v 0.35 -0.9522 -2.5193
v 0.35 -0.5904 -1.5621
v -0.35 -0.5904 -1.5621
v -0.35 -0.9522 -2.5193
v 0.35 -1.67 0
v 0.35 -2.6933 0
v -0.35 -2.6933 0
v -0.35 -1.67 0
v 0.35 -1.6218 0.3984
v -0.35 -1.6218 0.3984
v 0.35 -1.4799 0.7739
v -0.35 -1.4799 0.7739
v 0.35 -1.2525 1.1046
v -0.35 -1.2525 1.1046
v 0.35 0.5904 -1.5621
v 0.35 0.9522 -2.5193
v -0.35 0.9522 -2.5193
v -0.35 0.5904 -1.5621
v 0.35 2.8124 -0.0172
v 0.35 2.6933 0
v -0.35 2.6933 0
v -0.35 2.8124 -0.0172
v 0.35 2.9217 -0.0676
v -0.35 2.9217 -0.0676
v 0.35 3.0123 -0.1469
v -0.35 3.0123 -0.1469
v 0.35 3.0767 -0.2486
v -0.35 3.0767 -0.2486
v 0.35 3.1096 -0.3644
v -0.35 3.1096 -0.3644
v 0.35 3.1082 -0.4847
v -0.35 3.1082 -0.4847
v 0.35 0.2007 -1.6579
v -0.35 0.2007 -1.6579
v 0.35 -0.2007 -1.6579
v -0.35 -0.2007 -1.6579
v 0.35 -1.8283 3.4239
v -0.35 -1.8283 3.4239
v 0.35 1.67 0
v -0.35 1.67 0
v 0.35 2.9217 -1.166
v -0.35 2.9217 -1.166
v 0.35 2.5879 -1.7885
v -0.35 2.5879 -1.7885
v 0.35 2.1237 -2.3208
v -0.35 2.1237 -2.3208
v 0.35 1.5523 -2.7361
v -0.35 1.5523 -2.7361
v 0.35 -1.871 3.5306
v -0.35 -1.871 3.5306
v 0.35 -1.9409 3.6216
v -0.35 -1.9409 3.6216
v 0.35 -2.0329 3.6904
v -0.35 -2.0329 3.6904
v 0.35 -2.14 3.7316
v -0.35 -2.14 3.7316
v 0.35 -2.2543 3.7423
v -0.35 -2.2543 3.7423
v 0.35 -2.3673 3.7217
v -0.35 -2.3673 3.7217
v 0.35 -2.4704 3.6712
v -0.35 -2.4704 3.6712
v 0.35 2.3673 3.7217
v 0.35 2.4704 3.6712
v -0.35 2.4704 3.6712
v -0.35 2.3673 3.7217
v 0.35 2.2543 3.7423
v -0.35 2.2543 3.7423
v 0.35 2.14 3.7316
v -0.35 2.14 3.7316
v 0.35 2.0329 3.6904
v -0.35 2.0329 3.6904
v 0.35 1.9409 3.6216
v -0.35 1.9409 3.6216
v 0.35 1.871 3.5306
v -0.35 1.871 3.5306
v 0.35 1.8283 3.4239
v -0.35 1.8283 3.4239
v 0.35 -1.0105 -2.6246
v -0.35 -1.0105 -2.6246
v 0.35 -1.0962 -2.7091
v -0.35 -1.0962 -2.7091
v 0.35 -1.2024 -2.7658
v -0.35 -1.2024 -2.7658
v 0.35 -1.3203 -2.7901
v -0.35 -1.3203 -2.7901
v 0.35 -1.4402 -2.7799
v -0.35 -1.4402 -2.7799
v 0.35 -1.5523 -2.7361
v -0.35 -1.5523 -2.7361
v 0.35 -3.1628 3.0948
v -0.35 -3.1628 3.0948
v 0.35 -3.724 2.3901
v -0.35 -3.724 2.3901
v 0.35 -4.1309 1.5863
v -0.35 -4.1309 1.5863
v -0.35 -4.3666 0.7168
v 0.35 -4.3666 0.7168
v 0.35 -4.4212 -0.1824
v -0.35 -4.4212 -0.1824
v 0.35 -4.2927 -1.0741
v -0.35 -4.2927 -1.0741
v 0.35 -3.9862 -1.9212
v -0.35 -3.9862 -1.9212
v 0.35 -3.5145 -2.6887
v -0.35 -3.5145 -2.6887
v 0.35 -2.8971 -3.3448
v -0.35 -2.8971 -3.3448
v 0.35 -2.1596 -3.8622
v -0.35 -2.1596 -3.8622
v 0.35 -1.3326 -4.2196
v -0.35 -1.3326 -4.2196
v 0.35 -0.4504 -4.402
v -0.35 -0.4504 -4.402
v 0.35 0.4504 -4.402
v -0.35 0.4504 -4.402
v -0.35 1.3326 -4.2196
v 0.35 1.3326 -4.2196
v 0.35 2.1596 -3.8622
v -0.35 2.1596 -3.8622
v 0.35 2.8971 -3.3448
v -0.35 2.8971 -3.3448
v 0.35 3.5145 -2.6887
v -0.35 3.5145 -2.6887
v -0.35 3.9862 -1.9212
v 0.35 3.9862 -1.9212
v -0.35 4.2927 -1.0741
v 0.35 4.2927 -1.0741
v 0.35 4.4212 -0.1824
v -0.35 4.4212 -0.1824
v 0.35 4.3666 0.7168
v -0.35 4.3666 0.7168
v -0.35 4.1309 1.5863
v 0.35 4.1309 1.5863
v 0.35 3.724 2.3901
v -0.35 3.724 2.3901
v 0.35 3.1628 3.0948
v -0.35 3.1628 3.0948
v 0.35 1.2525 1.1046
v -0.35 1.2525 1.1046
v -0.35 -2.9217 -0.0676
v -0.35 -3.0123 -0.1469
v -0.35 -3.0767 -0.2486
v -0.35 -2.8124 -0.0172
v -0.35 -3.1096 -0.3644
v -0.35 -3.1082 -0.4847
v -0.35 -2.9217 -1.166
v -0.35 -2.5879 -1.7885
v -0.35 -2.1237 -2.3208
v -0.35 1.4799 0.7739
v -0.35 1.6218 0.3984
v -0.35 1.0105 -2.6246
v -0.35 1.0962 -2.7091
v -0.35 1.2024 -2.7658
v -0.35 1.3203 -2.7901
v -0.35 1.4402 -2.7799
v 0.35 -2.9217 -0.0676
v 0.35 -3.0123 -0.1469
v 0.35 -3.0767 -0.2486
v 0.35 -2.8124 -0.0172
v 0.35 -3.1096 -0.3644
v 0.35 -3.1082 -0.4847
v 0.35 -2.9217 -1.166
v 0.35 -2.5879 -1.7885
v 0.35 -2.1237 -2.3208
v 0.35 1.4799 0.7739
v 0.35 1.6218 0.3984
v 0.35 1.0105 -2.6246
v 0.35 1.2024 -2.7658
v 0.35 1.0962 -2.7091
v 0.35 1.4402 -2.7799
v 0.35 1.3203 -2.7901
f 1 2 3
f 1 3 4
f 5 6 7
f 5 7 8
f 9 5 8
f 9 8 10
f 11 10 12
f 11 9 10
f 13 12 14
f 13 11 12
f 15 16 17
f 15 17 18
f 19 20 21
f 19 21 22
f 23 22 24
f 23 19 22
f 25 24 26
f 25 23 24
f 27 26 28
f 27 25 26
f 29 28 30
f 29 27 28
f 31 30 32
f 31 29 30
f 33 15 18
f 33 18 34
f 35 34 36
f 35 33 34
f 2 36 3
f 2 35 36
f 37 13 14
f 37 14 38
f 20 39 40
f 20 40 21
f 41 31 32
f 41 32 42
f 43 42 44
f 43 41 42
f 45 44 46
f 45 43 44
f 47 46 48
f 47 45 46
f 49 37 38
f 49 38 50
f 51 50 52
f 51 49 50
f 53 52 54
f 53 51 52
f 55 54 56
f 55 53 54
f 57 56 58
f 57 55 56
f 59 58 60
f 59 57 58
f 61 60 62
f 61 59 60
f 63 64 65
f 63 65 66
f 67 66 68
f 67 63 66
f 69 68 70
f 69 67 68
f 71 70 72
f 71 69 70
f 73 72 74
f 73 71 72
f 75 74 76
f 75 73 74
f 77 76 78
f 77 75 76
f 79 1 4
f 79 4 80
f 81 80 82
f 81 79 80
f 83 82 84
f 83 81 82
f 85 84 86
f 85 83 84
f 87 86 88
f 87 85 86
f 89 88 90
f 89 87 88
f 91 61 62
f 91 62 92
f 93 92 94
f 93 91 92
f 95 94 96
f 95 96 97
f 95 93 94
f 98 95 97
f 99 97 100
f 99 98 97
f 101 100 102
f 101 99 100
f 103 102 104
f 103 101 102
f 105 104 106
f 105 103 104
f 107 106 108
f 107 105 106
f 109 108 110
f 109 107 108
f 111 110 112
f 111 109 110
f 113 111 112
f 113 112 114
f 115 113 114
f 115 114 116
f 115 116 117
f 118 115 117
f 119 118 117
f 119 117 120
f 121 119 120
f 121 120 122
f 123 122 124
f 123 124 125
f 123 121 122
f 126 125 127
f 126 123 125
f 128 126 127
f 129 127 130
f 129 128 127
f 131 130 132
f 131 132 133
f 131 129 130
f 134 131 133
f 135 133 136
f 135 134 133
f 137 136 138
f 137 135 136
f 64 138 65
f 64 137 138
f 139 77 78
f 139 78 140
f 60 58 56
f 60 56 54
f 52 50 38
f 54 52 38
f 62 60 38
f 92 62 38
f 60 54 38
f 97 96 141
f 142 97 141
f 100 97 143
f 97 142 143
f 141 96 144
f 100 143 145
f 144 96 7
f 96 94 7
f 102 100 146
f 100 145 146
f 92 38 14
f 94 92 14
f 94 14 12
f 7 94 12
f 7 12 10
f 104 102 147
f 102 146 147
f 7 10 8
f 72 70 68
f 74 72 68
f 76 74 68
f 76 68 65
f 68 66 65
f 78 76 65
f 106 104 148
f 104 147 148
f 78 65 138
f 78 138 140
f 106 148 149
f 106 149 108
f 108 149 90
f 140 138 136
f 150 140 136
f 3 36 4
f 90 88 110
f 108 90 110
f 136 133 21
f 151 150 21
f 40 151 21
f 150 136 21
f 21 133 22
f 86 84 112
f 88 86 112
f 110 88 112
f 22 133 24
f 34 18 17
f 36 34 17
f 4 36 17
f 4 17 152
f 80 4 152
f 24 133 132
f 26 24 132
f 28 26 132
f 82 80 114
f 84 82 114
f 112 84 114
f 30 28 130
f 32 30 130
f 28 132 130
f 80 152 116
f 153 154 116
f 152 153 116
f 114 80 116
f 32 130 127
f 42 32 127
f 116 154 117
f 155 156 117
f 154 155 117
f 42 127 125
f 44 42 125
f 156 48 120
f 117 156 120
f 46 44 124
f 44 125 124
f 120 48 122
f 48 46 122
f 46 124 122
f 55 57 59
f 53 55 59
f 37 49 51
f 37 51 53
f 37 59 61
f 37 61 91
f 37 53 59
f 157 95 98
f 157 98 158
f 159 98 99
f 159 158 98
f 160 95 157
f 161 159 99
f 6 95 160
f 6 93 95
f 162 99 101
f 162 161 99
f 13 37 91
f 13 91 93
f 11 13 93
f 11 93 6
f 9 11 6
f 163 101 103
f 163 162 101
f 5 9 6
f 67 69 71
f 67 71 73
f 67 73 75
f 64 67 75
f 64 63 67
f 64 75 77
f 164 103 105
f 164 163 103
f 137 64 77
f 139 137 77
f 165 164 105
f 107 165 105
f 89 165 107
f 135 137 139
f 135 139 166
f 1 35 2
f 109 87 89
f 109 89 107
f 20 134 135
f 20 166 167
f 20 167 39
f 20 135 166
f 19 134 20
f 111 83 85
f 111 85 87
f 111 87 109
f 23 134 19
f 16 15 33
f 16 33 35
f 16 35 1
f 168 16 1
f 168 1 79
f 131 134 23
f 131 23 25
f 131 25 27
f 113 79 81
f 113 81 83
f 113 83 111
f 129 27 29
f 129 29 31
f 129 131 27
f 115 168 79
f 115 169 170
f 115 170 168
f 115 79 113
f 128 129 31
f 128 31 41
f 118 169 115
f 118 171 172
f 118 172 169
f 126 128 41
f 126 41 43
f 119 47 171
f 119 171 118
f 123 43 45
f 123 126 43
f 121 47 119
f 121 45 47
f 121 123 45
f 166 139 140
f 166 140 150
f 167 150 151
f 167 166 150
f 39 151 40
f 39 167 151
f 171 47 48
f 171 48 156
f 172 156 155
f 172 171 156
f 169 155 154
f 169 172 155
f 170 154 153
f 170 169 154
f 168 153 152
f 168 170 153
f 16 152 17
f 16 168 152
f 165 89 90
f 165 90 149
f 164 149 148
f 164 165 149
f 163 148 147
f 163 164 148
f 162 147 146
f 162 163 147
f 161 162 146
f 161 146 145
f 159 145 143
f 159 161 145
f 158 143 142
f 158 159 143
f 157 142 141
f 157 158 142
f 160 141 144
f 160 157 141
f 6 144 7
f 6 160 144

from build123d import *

# Parameters (mm, degrees)
RESSALTO_EXTRUS_O1_DEPTH = 0.7


with BuildPart() as part:
    # Esboço1 → Ressalto-extrusão1 (new body)
    with BuildSketch(Plane(origin=(0.35, 0, 0), x_dir=(0, 0, -1), z_dir=(1, 0, 0))):
        with BuildLine():
            Line((-1.104601172, -1.2525), (-3.423938468, -1.828316235))
            ThreePointArc((-3.423938468, -1.828316235), (-3.714684542, -2.08501745), (-3.671190238, -2.470422481))
            ThreePointArc((-3.671190238, -2.470422481), (4.425, 0), (-3.671190238, 2.470422481))
            ThreePointArc((-3.671190238, 2.470422481), (-3.714684542, 2.08501745), (-3.423938468, 1.828316235))
            Line((-3.423938468, 1.828316235), (-1.104601172, 1.2525))
            ThreePointArc((-1.104601172, 1.2525), (-0.590434162, 1.562141959), (0, 1.67))
            Line((0, 1.67), (0, 2.693254687))
            ThreePointArc((0, 2.693254687), (0.146851884, 3.012300306), (0.484714793, 3.108239019))
            ThreePointArc((0.484714793, 3.108239019), (1.788476887, 2.587942939), (2.736118813, 1.552337615))
            ThreePointArc((2.736118813, 1.552337615), (2.765828941, 1.202376345), (2.519309074, 0.952209327))
            Line((2.519309074, 0.952209327), (1.562141959, 0.590434162))
            ThreePointArc((1.562141959, 0.590434162), (1.67, 0), (1.562141959, -0.590434162))
            Line((1.562141959, -0.590434162), (2.519309074, -0.952209327))
            ThreePointArc((2.519309074, -0.952209327), (2.765828941, -1.202376345), (2.736118813, -1.552337615))
            ThreePointArc((2.736118813, -1.552337615), (1.788476887, -2.587942939), (0.484714793, -3.108239019))
            ThreePointArc((0.484714793, -3.108239019), (0.146851884, -3.012300306), (0, -2.693254687))
            Line((0, -2.693254687), (0, -1.67))
            ThreePointArc((0, -1.67), (-0.590434162, -1.562141959), (-1.104601172, -1.2525))
        make_face()
    extrude(amount=-RESSALTO_EXTRUS_O1_DEPTH)


solid = part.part
